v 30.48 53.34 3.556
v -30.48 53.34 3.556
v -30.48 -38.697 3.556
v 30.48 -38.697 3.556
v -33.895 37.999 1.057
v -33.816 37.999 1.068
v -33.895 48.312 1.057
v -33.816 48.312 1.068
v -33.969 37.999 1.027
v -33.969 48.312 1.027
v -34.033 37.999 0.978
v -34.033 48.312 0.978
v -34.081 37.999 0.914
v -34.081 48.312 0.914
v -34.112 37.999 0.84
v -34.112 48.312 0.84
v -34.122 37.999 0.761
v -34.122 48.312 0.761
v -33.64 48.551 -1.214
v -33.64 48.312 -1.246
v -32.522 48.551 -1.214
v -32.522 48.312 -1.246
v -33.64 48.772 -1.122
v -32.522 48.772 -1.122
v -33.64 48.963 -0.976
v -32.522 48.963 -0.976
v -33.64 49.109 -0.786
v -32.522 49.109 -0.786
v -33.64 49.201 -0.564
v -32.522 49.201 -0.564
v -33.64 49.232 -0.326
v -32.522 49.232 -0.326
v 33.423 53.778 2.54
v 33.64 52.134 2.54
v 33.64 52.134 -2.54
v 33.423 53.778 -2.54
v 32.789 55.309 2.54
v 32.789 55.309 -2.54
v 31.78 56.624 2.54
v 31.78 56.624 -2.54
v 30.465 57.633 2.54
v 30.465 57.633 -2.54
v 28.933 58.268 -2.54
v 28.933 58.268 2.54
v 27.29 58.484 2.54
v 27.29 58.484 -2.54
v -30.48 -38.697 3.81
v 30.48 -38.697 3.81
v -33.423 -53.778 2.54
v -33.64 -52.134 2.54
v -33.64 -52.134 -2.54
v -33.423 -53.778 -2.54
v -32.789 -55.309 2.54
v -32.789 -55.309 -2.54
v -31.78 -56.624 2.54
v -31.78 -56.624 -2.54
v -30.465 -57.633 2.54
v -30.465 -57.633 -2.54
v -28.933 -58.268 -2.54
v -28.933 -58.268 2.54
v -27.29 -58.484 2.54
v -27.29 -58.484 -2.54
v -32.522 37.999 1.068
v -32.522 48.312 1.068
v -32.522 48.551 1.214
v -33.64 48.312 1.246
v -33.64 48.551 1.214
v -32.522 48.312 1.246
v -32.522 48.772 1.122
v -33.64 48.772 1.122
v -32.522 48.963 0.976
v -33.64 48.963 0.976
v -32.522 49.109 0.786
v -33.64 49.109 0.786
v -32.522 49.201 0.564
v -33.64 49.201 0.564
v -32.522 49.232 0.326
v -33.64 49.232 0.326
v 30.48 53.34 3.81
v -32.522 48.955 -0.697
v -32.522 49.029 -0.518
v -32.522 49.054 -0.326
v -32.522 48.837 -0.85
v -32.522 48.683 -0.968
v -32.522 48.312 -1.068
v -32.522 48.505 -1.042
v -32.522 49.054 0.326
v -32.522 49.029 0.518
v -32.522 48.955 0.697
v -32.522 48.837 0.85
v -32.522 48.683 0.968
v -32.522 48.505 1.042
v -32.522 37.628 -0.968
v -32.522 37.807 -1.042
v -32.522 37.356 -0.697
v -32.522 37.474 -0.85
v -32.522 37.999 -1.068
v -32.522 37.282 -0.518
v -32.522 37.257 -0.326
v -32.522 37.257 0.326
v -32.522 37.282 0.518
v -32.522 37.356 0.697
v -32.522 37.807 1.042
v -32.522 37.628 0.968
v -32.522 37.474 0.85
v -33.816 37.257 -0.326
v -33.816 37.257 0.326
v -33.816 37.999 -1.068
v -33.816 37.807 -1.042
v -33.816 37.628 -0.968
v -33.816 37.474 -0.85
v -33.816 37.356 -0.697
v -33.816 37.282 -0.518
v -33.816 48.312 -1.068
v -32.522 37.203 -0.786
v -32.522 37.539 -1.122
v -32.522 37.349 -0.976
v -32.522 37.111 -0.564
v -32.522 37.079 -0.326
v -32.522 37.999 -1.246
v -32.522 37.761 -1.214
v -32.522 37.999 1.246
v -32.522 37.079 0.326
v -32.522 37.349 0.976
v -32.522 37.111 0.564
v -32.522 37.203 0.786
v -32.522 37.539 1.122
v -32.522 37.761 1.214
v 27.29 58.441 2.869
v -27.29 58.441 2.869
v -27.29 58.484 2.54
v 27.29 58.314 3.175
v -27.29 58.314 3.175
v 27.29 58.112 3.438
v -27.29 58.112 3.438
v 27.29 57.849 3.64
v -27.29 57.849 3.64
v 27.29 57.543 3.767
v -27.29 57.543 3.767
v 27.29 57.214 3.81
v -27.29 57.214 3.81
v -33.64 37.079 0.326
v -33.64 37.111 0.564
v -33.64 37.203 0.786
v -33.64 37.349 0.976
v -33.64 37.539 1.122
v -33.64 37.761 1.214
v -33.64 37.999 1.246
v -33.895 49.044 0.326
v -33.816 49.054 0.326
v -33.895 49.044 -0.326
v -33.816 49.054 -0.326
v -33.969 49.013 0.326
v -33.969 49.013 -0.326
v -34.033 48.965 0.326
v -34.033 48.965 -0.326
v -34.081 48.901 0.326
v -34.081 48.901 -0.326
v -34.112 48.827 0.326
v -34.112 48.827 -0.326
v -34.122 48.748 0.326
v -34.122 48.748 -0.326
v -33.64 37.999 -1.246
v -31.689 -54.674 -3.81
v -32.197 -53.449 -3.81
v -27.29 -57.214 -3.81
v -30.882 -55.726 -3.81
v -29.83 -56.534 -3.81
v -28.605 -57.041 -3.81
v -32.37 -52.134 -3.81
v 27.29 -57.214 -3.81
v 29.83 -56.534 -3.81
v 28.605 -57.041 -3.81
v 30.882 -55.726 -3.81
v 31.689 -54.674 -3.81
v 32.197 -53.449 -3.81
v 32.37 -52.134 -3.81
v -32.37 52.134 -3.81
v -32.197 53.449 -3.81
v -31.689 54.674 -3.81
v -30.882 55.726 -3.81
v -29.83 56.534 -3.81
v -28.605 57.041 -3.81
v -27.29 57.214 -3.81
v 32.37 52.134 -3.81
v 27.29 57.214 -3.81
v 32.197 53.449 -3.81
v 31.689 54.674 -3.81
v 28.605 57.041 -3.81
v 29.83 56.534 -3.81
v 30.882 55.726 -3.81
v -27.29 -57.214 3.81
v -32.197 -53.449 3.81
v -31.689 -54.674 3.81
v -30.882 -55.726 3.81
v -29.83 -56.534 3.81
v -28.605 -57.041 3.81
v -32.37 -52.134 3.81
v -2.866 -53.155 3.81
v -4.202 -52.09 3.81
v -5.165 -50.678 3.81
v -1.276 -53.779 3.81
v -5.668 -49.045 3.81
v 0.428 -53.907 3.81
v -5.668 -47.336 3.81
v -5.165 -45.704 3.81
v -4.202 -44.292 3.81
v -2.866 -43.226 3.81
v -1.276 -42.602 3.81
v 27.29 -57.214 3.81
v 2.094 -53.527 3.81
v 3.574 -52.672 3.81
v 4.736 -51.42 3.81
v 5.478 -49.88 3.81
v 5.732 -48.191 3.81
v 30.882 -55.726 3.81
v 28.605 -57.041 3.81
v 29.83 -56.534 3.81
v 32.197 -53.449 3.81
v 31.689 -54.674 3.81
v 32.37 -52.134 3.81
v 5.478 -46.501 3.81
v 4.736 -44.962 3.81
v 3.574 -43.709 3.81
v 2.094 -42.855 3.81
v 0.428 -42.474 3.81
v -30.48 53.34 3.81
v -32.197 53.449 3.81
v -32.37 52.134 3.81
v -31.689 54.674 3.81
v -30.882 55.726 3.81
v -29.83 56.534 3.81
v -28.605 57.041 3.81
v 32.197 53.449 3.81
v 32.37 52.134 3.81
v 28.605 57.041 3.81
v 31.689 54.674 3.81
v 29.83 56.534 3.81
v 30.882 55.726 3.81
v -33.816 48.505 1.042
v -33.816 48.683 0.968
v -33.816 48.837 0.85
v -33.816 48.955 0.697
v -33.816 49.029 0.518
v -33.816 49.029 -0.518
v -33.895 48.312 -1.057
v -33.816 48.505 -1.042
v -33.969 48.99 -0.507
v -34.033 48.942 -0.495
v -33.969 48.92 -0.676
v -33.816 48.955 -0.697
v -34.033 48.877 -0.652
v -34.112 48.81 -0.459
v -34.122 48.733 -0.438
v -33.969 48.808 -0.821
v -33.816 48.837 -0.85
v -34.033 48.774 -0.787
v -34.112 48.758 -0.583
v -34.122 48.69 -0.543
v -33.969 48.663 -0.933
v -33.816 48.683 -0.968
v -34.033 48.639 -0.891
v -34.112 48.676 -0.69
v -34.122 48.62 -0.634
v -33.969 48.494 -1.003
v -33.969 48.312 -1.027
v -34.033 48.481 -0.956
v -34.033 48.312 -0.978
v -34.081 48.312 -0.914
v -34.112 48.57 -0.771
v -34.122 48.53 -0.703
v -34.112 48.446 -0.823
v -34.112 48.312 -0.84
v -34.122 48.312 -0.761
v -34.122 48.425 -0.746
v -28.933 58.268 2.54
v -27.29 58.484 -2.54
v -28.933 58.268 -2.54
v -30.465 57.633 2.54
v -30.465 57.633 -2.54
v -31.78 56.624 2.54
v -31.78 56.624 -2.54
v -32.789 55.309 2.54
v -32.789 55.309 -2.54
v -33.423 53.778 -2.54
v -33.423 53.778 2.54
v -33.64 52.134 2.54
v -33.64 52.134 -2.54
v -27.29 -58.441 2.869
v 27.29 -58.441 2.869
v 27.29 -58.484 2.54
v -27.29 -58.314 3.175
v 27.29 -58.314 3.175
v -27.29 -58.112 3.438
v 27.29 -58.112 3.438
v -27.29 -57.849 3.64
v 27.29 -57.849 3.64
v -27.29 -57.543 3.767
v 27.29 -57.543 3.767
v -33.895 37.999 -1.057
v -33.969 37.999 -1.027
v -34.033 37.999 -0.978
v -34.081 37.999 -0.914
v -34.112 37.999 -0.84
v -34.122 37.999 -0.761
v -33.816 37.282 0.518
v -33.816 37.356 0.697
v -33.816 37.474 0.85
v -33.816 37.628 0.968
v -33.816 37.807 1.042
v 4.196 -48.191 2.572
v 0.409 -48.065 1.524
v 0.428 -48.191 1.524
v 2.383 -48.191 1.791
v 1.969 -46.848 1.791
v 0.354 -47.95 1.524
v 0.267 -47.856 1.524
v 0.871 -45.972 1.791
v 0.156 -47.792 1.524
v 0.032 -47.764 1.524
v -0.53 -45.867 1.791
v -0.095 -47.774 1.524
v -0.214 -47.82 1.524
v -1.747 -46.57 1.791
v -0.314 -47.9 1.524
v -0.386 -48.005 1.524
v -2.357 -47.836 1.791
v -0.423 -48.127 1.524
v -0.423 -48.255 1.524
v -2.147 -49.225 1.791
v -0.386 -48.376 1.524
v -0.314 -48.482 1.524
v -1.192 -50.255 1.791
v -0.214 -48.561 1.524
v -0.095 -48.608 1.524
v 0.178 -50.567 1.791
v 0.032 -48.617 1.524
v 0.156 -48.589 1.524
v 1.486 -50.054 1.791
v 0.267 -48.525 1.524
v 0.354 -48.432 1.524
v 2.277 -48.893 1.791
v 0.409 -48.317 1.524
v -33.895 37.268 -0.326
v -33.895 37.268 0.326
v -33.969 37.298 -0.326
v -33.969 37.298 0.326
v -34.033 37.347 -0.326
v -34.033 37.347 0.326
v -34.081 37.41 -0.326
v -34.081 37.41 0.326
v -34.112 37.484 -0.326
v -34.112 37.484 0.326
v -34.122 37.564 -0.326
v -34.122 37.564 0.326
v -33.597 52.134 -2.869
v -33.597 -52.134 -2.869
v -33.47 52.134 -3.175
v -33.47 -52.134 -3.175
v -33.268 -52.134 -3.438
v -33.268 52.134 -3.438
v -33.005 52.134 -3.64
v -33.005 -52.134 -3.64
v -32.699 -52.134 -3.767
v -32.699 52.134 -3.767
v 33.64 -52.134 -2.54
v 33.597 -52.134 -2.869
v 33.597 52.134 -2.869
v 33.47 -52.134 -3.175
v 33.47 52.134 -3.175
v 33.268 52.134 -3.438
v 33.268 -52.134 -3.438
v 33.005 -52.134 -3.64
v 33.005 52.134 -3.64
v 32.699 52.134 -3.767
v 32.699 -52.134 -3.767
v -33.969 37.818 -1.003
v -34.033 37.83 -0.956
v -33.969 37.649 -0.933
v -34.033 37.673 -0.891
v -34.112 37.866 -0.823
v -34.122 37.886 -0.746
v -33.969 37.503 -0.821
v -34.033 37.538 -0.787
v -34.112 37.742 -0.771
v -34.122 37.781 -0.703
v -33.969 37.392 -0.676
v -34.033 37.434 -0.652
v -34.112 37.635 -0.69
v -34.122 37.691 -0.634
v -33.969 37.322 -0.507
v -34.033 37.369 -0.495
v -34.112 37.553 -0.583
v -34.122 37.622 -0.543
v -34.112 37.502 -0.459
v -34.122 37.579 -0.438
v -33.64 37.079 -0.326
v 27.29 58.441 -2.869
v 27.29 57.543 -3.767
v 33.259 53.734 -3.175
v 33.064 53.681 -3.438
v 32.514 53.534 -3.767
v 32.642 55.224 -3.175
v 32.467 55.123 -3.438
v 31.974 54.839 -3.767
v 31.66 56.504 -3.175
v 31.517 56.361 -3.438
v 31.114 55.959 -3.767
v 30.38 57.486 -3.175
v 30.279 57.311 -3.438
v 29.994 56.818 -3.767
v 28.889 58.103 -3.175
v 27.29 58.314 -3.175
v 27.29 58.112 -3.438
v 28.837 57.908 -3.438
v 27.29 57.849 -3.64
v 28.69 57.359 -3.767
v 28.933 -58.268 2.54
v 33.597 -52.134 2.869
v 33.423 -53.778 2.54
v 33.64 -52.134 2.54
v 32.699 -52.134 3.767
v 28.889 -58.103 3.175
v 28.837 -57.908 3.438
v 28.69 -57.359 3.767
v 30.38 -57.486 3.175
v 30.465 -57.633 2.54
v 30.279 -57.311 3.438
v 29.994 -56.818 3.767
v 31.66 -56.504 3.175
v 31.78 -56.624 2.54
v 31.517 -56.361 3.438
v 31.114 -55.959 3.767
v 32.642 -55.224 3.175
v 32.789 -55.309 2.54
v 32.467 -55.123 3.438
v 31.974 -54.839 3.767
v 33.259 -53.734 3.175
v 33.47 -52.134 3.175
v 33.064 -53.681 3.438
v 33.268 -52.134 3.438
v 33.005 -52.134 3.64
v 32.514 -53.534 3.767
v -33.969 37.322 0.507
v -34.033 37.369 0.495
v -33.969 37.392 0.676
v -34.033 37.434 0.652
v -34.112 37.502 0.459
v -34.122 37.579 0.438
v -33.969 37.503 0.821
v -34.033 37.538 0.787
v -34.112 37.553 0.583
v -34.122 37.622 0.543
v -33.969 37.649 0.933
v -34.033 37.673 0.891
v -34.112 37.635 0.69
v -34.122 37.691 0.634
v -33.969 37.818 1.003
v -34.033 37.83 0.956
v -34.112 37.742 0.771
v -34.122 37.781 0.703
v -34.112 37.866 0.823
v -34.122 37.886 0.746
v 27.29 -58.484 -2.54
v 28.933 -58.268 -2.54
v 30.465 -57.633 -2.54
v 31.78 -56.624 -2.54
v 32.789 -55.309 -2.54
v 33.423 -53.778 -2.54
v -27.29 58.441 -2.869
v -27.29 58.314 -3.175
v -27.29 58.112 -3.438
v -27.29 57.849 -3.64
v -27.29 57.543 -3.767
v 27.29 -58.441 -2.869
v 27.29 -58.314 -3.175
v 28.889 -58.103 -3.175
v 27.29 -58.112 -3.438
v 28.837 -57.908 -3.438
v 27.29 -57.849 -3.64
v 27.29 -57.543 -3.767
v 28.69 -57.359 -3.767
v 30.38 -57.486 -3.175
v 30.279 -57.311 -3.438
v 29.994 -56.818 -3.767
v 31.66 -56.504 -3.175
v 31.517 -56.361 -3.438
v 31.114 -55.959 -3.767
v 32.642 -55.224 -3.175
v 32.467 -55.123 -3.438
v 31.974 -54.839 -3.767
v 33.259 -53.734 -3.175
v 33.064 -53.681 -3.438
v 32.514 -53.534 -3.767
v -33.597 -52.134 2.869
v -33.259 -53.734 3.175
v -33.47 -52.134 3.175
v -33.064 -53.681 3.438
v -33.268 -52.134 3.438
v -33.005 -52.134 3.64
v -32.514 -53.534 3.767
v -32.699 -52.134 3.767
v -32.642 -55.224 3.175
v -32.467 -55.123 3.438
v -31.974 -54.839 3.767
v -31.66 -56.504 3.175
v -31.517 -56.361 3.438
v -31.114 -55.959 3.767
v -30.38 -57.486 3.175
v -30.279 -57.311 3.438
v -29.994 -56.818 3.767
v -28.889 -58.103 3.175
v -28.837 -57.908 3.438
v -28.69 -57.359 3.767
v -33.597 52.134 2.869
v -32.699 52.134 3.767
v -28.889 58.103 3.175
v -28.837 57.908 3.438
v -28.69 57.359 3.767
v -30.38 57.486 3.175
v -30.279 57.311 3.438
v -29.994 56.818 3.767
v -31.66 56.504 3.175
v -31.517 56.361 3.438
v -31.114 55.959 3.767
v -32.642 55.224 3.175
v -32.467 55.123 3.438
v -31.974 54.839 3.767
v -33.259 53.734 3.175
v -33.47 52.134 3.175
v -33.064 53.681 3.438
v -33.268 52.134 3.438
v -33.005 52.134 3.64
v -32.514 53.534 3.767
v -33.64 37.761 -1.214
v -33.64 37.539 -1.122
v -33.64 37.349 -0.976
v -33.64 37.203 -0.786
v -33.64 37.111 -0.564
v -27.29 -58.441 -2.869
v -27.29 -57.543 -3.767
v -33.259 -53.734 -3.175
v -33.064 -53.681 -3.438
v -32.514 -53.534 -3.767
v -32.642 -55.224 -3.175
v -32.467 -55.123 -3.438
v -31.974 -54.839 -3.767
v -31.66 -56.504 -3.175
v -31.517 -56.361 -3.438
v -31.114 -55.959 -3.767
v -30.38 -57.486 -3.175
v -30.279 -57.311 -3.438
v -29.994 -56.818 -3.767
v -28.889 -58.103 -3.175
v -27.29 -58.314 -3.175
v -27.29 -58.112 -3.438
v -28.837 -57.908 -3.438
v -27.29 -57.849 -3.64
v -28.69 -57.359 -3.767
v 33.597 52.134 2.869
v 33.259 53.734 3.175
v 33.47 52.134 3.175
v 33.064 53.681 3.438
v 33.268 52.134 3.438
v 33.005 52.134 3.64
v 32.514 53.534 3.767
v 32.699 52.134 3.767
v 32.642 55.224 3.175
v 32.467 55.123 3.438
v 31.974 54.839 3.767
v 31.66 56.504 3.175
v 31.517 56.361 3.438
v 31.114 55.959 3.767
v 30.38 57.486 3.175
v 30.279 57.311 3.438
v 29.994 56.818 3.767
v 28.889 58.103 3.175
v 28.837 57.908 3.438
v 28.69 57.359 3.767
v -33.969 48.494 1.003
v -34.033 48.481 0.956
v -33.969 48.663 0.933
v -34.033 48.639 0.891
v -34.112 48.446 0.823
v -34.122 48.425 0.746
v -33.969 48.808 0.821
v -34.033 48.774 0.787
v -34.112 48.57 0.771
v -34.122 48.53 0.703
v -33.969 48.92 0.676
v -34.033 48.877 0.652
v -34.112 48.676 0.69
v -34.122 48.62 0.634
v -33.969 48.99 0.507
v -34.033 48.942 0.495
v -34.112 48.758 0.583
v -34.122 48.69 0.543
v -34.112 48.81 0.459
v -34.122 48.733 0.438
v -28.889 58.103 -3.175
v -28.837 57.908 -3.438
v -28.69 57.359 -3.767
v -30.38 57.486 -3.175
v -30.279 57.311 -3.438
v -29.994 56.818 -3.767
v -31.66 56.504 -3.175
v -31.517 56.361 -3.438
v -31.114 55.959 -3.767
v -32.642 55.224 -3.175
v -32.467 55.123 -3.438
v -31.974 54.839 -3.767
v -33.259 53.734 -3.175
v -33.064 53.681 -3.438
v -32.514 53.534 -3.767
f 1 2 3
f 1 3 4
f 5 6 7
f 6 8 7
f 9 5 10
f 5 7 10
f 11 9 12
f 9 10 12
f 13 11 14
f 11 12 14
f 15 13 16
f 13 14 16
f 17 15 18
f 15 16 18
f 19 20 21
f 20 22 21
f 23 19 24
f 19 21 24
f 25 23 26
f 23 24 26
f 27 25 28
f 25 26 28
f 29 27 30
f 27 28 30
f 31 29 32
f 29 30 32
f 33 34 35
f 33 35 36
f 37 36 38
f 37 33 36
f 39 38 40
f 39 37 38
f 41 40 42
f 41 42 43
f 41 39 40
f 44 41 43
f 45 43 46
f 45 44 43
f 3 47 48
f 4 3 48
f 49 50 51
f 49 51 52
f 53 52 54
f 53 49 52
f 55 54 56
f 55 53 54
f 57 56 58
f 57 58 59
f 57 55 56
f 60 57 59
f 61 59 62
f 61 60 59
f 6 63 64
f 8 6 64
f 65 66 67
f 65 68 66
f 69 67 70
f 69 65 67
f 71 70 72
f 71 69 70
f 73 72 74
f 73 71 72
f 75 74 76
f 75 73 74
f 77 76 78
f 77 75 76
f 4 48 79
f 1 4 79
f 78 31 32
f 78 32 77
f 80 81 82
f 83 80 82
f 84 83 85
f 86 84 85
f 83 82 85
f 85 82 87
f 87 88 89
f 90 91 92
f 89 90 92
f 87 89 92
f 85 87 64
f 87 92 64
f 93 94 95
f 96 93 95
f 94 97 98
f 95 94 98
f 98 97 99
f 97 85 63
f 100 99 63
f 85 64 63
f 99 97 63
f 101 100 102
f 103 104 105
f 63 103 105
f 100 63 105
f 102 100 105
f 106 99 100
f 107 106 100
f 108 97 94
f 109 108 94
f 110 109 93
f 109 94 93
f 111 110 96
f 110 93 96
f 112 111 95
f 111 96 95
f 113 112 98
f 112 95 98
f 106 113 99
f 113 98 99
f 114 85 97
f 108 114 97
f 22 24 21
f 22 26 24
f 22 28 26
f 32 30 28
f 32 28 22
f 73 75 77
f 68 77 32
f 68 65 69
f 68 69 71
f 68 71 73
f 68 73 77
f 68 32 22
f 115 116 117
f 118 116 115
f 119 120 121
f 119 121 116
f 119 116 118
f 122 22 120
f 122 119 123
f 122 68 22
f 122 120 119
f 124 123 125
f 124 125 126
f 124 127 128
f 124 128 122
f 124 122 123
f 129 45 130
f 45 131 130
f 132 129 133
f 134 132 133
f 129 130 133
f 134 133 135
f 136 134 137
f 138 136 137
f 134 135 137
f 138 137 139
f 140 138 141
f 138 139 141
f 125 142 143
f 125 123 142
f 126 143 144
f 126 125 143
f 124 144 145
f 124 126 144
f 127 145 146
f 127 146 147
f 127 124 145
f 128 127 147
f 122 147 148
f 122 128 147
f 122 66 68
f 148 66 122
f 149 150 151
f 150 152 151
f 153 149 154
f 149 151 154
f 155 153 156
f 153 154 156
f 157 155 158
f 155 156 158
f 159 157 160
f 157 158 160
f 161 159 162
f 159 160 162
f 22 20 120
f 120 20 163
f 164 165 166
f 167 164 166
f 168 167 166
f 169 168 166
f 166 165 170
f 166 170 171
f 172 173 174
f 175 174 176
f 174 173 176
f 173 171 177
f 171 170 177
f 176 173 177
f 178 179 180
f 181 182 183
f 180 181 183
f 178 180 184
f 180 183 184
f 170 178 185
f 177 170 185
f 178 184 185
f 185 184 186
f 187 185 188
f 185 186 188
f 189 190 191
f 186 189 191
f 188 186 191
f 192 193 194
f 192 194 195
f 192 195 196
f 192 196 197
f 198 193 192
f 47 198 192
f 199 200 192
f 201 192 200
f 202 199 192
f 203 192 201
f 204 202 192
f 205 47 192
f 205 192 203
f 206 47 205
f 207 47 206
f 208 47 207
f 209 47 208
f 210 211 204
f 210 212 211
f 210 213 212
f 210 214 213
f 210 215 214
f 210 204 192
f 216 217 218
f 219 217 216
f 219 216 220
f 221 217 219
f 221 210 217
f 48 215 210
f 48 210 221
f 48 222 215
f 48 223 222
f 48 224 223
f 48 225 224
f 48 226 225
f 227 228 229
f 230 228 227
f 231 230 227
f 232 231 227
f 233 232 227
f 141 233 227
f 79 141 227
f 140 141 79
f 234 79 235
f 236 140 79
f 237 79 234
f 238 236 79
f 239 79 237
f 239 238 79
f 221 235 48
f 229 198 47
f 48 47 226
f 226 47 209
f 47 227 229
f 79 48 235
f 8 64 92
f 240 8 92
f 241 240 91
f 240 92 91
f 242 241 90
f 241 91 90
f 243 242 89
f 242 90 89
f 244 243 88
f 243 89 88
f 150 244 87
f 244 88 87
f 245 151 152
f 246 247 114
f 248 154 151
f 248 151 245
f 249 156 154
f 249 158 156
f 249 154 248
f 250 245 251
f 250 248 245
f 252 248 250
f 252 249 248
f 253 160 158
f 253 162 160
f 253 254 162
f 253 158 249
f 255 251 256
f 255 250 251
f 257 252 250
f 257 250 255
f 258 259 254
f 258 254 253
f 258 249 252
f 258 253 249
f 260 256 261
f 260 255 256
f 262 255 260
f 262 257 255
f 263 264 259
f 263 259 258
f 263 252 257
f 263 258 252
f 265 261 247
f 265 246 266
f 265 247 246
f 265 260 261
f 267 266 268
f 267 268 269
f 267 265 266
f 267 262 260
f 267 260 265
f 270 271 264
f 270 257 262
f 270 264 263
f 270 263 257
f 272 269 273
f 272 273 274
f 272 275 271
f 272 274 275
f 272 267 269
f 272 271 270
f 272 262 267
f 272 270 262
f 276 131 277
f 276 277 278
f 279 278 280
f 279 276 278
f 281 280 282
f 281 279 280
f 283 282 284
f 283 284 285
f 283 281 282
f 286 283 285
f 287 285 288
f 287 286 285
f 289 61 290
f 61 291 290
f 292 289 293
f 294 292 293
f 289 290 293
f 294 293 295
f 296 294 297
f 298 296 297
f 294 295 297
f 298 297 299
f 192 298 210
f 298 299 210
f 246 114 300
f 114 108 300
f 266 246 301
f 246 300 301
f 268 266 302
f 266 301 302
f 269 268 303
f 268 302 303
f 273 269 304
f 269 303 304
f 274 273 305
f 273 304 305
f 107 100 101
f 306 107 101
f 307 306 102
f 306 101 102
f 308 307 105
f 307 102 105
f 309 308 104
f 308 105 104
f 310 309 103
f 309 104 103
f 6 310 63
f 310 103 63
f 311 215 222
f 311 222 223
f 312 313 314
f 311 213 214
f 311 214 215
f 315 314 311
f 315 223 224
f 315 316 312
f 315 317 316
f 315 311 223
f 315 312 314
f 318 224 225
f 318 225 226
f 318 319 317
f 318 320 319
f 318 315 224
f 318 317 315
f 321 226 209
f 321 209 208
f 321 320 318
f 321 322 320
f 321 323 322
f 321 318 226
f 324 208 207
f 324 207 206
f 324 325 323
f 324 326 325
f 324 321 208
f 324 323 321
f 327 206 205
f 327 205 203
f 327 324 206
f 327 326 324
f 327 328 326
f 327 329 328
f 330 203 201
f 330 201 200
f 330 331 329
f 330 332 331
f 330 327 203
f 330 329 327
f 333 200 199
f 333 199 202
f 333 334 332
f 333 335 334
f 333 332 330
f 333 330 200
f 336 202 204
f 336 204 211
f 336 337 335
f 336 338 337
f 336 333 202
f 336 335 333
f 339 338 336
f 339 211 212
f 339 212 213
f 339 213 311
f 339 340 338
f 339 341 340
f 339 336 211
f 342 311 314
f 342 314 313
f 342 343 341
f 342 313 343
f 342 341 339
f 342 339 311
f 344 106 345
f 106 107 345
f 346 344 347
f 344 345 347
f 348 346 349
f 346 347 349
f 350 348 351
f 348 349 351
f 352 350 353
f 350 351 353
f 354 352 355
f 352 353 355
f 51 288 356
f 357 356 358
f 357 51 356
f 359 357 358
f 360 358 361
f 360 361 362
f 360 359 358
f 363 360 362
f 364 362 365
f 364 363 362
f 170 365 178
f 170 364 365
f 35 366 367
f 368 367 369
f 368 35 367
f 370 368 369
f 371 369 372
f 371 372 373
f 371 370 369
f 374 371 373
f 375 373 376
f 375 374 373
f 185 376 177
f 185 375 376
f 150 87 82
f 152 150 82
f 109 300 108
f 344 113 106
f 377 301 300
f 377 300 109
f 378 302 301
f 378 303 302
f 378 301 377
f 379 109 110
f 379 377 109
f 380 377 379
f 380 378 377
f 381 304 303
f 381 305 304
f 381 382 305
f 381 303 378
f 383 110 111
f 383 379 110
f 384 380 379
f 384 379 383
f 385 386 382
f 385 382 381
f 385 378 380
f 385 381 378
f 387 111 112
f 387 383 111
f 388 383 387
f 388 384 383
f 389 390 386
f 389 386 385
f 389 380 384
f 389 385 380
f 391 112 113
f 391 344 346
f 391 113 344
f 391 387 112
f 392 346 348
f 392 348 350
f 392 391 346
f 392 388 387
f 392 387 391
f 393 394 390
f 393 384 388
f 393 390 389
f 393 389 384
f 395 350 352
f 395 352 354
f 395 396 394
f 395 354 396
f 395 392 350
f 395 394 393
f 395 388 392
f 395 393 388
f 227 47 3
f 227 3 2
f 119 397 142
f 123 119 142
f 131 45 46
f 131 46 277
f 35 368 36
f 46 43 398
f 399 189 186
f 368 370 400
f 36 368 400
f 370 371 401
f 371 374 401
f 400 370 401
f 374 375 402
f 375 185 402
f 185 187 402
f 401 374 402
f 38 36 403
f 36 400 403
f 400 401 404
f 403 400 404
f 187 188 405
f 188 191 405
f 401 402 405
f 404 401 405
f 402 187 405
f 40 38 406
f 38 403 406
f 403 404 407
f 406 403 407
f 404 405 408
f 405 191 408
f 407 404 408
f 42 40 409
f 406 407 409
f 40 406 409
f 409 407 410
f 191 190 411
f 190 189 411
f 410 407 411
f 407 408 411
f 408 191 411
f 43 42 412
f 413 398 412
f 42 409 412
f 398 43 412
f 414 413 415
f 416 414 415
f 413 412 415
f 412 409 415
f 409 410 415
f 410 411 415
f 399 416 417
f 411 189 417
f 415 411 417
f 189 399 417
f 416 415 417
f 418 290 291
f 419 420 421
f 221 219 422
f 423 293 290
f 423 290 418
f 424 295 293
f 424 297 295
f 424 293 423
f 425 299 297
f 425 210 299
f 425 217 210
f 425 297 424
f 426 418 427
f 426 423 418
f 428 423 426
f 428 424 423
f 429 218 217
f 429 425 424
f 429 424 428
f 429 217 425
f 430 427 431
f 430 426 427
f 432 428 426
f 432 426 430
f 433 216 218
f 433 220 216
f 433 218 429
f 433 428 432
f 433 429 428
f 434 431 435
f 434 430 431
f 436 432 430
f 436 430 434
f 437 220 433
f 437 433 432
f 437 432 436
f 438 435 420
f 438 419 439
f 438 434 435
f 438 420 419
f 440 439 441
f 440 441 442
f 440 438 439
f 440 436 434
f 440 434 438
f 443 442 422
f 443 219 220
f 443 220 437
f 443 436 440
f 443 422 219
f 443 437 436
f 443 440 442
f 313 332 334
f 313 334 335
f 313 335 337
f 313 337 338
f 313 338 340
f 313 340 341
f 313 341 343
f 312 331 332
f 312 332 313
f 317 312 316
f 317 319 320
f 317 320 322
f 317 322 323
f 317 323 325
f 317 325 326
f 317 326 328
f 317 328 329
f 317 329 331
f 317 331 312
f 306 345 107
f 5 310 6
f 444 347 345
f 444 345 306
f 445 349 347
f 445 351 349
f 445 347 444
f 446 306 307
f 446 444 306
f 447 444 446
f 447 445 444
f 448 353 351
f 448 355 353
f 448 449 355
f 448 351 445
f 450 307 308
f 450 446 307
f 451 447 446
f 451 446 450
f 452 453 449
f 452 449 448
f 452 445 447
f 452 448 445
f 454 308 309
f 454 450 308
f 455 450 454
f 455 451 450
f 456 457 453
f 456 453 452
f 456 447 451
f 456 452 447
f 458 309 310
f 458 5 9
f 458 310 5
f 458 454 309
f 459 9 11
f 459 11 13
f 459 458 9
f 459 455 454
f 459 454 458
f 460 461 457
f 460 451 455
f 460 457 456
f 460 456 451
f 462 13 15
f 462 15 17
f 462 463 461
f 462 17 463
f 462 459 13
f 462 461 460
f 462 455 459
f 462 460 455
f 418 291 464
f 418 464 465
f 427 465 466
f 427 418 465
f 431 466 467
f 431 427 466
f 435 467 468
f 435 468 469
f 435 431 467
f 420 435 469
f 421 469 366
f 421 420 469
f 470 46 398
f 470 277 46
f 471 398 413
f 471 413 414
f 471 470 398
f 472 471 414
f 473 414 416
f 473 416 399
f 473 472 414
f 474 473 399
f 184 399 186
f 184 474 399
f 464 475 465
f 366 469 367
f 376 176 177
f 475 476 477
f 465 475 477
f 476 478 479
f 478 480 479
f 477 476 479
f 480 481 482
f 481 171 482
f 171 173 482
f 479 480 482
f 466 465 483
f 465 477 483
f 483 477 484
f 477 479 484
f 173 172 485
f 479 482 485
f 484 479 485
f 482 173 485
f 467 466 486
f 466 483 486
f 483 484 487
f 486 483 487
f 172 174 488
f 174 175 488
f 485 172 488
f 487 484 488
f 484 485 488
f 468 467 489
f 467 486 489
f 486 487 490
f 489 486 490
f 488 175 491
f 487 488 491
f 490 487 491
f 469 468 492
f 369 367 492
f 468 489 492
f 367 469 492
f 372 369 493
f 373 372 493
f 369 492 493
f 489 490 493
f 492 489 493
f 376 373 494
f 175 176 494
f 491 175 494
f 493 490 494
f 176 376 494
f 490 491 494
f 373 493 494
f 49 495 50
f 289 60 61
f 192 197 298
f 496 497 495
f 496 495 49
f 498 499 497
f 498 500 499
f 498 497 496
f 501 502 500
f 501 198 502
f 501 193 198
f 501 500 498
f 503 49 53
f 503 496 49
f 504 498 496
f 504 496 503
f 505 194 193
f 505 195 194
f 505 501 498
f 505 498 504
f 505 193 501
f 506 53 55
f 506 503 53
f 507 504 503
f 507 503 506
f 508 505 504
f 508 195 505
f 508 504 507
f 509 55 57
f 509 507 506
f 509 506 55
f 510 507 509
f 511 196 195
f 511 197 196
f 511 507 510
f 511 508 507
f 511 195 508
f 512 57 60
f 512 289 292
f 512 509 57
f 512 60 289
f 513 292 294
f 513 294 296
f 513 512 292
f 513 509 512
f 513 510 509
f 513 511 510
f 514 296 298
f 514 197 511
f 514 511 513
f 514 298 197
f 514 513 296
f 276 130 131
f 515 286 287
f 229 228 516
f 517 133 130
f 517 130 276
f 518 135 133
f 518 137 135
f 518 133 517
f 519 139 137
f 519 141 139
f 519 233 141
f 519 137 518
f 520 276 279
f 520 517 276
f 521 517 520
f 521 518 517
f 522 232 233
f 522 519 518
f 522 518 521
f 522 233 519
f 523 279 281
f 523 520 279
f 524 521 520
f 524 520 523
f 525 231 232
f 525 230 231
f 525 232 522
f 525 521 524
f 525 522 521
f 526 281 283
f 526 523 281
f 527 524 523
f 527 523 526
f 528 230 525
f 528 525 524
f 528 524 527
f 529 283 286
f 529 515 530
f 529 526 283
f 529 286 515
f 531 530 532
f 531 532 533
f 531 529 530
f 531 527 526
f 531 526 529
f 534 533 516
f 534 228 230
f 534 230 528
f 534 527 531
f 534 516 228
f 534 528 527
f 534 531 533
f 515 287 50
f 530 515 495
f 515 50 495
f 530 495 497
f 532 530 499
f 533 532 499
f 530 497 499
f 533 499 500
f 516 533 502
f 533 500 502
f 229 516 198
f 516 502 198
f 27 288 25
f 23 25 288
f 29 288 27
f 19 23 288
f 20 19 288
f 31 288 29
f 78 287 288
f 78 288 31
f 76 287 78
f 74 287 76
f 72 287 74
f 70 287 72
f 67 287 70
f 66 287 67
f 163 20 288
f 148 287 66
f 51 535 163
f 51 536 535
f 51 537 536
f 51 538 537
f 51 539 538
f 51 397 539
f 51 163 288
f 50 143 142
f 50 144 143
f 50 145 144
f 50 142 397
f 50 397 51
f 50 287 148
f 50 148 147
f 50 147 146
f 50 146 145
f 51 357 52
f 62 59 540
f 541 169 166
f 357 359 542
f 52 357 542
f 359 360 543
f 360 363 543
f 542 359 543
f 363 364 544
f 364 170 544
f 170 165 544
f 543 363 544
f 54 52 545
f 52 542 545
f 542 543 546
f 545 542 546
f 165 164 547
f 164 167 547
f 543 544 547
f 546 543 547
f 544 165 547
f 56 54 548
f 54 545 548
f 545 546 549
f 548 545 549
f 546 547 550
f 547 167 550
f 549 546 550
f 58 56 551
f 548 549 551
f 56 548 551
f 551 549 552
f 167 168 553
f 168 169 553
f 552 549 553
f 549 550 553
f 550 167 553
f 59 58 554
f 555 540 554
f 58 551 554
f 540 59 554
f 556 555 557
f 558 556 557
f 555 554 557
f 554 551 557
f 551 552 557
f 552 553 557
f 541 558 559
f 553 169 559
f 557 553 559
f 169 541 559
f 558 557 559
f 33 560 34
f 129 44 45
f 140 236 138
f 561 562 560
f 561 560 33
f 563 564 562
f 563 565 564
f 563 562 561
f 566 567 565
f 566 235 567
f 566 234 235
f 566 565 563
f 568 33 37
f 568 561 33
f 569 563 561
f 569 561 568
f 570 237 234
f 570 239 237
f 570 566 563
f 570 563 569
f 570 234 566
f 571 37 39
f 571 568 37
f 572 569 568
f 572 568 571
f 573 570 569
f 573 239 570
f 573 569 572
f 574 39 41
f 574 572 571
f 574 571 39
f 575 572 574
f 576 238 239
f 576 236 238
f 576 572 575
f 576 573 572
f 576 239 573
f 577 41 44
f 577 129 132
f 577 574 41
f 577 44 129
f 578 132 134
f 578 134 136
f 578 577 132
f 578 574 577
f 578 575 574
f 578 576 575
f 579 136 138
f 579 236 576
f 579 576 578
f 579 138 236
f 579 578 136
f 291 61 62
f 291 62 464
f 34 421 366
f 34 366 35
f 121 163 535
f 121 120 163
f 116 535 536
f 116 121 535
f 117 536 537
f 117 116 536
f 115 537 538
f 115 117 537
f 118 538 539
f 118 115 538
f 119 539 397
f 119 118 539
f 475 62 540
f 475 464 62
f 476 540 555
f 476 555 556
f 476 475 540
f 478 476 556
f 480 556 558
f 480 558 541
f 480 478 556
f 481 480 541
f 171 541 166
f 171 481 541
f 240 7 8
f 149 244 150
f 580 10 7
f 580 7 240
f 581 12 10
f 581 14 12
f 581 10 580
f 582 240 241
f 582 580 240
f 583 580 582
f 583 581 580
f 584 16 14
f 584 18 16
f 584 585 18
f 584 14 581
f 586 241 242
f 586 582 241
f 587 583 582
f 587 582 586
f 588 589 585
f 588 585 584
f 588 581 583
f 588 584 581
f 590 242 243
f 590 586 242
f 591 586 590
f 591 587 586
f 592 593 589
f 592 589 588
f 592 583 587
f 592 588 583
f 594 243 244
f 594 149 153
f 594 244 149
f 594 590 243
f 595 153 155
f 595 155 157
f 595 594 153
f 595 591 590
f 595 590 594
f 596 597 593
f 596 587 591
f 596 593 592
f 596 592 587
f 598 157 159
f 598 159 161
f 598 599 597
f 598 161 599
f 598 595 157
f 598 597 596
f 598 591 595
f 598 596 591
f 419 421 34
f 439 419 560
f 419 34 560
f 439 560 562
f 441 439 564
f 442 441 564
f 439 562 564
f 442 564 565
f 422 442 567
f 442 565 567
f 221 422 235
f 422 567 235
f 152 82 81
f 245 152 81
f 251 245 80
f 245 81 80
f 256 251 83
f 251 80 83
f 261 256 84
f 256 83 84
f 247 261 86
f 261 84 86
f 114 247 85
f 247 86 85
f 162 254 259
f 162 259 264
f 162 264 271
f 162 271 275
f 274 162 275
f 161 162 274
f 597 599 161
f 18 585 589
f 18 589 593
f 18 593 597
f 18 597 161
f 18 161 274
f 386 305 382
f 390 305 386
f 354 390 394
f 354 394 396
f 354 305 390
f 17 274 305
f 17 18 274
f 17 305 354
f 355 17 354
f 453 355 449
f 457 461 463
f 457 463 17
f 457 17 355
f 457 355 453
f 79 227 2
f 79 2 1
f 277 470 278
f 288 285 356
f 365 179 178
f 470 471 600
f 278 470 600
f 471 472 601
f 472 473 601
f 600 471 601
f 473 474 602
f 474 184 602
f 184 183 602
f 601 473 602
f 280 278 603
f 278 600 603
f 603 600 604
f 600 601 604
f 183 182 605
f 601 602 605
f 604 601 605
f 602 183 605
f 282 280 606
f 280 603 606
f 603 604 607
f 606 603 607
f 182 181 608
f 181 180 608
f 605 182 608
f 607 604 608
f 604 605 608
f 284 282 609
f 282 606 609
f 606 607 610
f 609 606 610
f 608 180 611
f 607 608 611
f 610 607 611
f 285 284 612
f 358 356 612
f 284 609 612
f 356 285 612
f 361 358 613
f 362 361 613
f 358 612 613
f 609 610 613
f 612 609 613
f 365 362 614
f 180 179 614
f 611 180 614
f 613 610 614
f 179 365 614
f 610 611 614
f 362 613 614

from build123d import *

# Parameters (mm, degrees)
F1_DEPTH  = 3.81
F2_R      = 1.27
F3_R      = 5.7323628205
F4_DEPTH  = 2.286
F3_W      = 60.96
F3_H      = 92.0373842978
F6_DEPTH  = 0.254
F7_W      = 12.1530219913
F7_H      = 2.4910259526
F8_DEPTH  = 1.1176
F9_R      = 0.9198153673
F11_DEPTH = 1.6002
F12_R     = 0.3066051224


# Not quite as in the source:
# - a fillet or chamfer that OpenCascade refuses, or shapes differently, is made with other operations: its cross-section is extruded or revolved along the edge and cut away or added


with BuildPart() as f1:
    # F0 (on Top) → F1 (new body, symmetric)
    with BuildSketch(Plane.XY):
        with BuildLine():
            Line((-27.2898482323, -58.4841631353), (27.2898482323, -58.4841631353))
            ThreePointArc((27.2898482323, -58.4841631353), (31.7799762928, -56.6242911958), (33.6398482323, -52.1341631353))
            Line((33.6398482323, -52.1341631353), (33.6398482323, 52.1341631353))
            ThreePointArc((33.6398482323, 52.1341631353), (31.7799762928, 56.6242911958), (27.2898482323, 58.4841631353))
            Line((27.2898482323, 58.4841631353), (-27.2898482323, 58.4841631353))
            ThreePointArc((-27.2898482323, 58.4841631353), (-31.7799762928, 56.6242911958), (-33.6398482323, 52.1341631353))
            Line((-33.6398482323, 52.1341631353), (-33.6398482323, -52.1341631353))
            ThreePointArc((-33.6398482323, -52.1341631353), (-31.7799762928, -56.6242911958), (-27.2898482323, -58.4841631353))
        make_face()
    extrude(amount=F1_DEPTH, both=True)

    # F2
    f2_edges = [f1.edges().sort_by_distance(p)[0] for p in [
        (33.639848, 0, 3.81),
        (33.639848, 0, -3.81),
        (-33.639848, 0, -3.81),
        (-33.639848, 0, 3.81),
        (-31.779976, 56.624291, -3.81),
        (-31.779976, 56.624291, 3.81),
        (0, 58.484163, -3.81),
        (0, 58.484163, 3.81),
        (31.779976, 56.624291, -3.81),
        (31.779976, 56.624291, 3.81),
        (31.779976, -56.624291, -3.81),
        (31.779976, -56.624291, 3.81),
        (0, -58.484163, -3.81),
        (0, -58.484163, 3.81),
        (-31.779976, -56.624291, 3.81),
        (-31.779976, -56.624291, -3.81),
    ]]
    fillet(f2_edges, radius=F2_R)

    # F3 (on face) → F4 (cut)
    with BuildSketch(Plane.XY.offset(3.81)):
        with Locations((0, -48.1907315552)):
            Circle(F3_R)
    extrude(amount=-F4_DEPTH, mode=Mode.SUBTRACT)

    # F5: fillet of radius 7.2972019136 on 1 edges, made by hand

    # F5_s1 → F5_t2 (revolve)
    with BuildSketch(Plane.XZ.offset(48.1907315552)):
        with BuildLine():
            ThreePointArc((5.7323628205, 3.81), (3.3159569781, 2.1198248924), (0.4279296605, 1.524))
            Line((0.4279296605, 1.524), (5.7323628205, 1.524))
            Line((5.7323628205, 1.524), (5.7323628205, 3.81))
        make_face()
    revolve(axis=Axis((0, -48.1907315552, 1.524), (0, 0, 1)))

    # F3 (on face) → F6 (cut)
    with BuildSketch(Plane.XY.offset(3.81)):
        with Locations((0, 7.3213078511)):
            Rectangle(F3_W, F3_H)
    extrude(amount=-F6_DEPTH, mode=Mode.SUBTRACT)

    # F7 (on face) → F8 (cut)
    with BuildSketch(Plane(origin=(-33.6398482323, 0, 0), x_dir=(0, -1, 0), z_dir=(-1, 0, 0))):
        with Locations((-43.15578565, 0)):
            Rectangle(F7_W, F7_H)
    extrude(amount=-F8_DEPTH, mode=Mode.SUBTRACT)

    # F9
    f9_edges = [f1.edges().sort_by_distance(p)[0] for p in [
        (-33.081048, 37.079275, 1.245513),
        (-33.081048, 49.232297, 1.245513),
        (-33.081048, 49.232297, -1.245513),
        (-33.081048, 37.079275, -1.245513),
    ]]
    fillet(f9_edges, radius=F9_R)


with BuildPart() as f11:
    # F10 (on face) → F11 (new body)
    with BuildSketch(Plane(origin=(-32.5222482323, 0, 0), x_dir=(0, -1, 0), z_dir=(-1, 0, 0))):
        with BuildLine():
            Line((-48.3124812784, -1.0677123209), (-37.9990900217, -1.0677123209))
            ThreePointArc((-37.9990900217, -1.0677123209), (-37.4744063871, -0.8503812436), (-37.2570753098, -0.325697609))
            Line((-37.2570753098, -0.325697609), (-37.2570753098, 0.325697609))
            ThreePointArc((-37.2570753098, 0.325697609), (-37.4744063871, 0.8503812436), (-37.9990900217, 1.0677123209))
            Line((-37.9990900217, 1.0677123209), (-48.3124812784, 1.0677123209))
            ThreePointArc((-48.3124812784, 1.0677123209), (-48.8371649129, 0.8503812436), (-49.0544959903, 0.325697609))
            Line((-49.0544959903, 0.325697609), (-49.0544959903, -0.325697609))
            ThreePointArc((-49.0544959903, -0.325697609), (-48.8371649129, -0.8503812436), (-48.3124812784, -1.0677123209))
        make_face()
    extrude(amount=F11_DEPTH)

    # F12
    f12_edges = [f11.edges().sort_by_distance(p)[0] for p in [
        (-34.122448, 37.474406, -0.850381),
        (-34.122448, 37.257075, 0),
        (-34.122448, 37.474406, 0.850381),
        (-34.122448, 43.155786, 1.067712),
        (-34.122448, 48.837165, 0.850381),
        (-34.122448, 49.054496, 0),
        (-34.122448, 48.837165, -0.850381),
        (-34.122448, 43.155786, -1.067712),
    ]]
    fillet(f12_edges, radius=F12_R)


solid = Compound([f1.part, f11.part])
